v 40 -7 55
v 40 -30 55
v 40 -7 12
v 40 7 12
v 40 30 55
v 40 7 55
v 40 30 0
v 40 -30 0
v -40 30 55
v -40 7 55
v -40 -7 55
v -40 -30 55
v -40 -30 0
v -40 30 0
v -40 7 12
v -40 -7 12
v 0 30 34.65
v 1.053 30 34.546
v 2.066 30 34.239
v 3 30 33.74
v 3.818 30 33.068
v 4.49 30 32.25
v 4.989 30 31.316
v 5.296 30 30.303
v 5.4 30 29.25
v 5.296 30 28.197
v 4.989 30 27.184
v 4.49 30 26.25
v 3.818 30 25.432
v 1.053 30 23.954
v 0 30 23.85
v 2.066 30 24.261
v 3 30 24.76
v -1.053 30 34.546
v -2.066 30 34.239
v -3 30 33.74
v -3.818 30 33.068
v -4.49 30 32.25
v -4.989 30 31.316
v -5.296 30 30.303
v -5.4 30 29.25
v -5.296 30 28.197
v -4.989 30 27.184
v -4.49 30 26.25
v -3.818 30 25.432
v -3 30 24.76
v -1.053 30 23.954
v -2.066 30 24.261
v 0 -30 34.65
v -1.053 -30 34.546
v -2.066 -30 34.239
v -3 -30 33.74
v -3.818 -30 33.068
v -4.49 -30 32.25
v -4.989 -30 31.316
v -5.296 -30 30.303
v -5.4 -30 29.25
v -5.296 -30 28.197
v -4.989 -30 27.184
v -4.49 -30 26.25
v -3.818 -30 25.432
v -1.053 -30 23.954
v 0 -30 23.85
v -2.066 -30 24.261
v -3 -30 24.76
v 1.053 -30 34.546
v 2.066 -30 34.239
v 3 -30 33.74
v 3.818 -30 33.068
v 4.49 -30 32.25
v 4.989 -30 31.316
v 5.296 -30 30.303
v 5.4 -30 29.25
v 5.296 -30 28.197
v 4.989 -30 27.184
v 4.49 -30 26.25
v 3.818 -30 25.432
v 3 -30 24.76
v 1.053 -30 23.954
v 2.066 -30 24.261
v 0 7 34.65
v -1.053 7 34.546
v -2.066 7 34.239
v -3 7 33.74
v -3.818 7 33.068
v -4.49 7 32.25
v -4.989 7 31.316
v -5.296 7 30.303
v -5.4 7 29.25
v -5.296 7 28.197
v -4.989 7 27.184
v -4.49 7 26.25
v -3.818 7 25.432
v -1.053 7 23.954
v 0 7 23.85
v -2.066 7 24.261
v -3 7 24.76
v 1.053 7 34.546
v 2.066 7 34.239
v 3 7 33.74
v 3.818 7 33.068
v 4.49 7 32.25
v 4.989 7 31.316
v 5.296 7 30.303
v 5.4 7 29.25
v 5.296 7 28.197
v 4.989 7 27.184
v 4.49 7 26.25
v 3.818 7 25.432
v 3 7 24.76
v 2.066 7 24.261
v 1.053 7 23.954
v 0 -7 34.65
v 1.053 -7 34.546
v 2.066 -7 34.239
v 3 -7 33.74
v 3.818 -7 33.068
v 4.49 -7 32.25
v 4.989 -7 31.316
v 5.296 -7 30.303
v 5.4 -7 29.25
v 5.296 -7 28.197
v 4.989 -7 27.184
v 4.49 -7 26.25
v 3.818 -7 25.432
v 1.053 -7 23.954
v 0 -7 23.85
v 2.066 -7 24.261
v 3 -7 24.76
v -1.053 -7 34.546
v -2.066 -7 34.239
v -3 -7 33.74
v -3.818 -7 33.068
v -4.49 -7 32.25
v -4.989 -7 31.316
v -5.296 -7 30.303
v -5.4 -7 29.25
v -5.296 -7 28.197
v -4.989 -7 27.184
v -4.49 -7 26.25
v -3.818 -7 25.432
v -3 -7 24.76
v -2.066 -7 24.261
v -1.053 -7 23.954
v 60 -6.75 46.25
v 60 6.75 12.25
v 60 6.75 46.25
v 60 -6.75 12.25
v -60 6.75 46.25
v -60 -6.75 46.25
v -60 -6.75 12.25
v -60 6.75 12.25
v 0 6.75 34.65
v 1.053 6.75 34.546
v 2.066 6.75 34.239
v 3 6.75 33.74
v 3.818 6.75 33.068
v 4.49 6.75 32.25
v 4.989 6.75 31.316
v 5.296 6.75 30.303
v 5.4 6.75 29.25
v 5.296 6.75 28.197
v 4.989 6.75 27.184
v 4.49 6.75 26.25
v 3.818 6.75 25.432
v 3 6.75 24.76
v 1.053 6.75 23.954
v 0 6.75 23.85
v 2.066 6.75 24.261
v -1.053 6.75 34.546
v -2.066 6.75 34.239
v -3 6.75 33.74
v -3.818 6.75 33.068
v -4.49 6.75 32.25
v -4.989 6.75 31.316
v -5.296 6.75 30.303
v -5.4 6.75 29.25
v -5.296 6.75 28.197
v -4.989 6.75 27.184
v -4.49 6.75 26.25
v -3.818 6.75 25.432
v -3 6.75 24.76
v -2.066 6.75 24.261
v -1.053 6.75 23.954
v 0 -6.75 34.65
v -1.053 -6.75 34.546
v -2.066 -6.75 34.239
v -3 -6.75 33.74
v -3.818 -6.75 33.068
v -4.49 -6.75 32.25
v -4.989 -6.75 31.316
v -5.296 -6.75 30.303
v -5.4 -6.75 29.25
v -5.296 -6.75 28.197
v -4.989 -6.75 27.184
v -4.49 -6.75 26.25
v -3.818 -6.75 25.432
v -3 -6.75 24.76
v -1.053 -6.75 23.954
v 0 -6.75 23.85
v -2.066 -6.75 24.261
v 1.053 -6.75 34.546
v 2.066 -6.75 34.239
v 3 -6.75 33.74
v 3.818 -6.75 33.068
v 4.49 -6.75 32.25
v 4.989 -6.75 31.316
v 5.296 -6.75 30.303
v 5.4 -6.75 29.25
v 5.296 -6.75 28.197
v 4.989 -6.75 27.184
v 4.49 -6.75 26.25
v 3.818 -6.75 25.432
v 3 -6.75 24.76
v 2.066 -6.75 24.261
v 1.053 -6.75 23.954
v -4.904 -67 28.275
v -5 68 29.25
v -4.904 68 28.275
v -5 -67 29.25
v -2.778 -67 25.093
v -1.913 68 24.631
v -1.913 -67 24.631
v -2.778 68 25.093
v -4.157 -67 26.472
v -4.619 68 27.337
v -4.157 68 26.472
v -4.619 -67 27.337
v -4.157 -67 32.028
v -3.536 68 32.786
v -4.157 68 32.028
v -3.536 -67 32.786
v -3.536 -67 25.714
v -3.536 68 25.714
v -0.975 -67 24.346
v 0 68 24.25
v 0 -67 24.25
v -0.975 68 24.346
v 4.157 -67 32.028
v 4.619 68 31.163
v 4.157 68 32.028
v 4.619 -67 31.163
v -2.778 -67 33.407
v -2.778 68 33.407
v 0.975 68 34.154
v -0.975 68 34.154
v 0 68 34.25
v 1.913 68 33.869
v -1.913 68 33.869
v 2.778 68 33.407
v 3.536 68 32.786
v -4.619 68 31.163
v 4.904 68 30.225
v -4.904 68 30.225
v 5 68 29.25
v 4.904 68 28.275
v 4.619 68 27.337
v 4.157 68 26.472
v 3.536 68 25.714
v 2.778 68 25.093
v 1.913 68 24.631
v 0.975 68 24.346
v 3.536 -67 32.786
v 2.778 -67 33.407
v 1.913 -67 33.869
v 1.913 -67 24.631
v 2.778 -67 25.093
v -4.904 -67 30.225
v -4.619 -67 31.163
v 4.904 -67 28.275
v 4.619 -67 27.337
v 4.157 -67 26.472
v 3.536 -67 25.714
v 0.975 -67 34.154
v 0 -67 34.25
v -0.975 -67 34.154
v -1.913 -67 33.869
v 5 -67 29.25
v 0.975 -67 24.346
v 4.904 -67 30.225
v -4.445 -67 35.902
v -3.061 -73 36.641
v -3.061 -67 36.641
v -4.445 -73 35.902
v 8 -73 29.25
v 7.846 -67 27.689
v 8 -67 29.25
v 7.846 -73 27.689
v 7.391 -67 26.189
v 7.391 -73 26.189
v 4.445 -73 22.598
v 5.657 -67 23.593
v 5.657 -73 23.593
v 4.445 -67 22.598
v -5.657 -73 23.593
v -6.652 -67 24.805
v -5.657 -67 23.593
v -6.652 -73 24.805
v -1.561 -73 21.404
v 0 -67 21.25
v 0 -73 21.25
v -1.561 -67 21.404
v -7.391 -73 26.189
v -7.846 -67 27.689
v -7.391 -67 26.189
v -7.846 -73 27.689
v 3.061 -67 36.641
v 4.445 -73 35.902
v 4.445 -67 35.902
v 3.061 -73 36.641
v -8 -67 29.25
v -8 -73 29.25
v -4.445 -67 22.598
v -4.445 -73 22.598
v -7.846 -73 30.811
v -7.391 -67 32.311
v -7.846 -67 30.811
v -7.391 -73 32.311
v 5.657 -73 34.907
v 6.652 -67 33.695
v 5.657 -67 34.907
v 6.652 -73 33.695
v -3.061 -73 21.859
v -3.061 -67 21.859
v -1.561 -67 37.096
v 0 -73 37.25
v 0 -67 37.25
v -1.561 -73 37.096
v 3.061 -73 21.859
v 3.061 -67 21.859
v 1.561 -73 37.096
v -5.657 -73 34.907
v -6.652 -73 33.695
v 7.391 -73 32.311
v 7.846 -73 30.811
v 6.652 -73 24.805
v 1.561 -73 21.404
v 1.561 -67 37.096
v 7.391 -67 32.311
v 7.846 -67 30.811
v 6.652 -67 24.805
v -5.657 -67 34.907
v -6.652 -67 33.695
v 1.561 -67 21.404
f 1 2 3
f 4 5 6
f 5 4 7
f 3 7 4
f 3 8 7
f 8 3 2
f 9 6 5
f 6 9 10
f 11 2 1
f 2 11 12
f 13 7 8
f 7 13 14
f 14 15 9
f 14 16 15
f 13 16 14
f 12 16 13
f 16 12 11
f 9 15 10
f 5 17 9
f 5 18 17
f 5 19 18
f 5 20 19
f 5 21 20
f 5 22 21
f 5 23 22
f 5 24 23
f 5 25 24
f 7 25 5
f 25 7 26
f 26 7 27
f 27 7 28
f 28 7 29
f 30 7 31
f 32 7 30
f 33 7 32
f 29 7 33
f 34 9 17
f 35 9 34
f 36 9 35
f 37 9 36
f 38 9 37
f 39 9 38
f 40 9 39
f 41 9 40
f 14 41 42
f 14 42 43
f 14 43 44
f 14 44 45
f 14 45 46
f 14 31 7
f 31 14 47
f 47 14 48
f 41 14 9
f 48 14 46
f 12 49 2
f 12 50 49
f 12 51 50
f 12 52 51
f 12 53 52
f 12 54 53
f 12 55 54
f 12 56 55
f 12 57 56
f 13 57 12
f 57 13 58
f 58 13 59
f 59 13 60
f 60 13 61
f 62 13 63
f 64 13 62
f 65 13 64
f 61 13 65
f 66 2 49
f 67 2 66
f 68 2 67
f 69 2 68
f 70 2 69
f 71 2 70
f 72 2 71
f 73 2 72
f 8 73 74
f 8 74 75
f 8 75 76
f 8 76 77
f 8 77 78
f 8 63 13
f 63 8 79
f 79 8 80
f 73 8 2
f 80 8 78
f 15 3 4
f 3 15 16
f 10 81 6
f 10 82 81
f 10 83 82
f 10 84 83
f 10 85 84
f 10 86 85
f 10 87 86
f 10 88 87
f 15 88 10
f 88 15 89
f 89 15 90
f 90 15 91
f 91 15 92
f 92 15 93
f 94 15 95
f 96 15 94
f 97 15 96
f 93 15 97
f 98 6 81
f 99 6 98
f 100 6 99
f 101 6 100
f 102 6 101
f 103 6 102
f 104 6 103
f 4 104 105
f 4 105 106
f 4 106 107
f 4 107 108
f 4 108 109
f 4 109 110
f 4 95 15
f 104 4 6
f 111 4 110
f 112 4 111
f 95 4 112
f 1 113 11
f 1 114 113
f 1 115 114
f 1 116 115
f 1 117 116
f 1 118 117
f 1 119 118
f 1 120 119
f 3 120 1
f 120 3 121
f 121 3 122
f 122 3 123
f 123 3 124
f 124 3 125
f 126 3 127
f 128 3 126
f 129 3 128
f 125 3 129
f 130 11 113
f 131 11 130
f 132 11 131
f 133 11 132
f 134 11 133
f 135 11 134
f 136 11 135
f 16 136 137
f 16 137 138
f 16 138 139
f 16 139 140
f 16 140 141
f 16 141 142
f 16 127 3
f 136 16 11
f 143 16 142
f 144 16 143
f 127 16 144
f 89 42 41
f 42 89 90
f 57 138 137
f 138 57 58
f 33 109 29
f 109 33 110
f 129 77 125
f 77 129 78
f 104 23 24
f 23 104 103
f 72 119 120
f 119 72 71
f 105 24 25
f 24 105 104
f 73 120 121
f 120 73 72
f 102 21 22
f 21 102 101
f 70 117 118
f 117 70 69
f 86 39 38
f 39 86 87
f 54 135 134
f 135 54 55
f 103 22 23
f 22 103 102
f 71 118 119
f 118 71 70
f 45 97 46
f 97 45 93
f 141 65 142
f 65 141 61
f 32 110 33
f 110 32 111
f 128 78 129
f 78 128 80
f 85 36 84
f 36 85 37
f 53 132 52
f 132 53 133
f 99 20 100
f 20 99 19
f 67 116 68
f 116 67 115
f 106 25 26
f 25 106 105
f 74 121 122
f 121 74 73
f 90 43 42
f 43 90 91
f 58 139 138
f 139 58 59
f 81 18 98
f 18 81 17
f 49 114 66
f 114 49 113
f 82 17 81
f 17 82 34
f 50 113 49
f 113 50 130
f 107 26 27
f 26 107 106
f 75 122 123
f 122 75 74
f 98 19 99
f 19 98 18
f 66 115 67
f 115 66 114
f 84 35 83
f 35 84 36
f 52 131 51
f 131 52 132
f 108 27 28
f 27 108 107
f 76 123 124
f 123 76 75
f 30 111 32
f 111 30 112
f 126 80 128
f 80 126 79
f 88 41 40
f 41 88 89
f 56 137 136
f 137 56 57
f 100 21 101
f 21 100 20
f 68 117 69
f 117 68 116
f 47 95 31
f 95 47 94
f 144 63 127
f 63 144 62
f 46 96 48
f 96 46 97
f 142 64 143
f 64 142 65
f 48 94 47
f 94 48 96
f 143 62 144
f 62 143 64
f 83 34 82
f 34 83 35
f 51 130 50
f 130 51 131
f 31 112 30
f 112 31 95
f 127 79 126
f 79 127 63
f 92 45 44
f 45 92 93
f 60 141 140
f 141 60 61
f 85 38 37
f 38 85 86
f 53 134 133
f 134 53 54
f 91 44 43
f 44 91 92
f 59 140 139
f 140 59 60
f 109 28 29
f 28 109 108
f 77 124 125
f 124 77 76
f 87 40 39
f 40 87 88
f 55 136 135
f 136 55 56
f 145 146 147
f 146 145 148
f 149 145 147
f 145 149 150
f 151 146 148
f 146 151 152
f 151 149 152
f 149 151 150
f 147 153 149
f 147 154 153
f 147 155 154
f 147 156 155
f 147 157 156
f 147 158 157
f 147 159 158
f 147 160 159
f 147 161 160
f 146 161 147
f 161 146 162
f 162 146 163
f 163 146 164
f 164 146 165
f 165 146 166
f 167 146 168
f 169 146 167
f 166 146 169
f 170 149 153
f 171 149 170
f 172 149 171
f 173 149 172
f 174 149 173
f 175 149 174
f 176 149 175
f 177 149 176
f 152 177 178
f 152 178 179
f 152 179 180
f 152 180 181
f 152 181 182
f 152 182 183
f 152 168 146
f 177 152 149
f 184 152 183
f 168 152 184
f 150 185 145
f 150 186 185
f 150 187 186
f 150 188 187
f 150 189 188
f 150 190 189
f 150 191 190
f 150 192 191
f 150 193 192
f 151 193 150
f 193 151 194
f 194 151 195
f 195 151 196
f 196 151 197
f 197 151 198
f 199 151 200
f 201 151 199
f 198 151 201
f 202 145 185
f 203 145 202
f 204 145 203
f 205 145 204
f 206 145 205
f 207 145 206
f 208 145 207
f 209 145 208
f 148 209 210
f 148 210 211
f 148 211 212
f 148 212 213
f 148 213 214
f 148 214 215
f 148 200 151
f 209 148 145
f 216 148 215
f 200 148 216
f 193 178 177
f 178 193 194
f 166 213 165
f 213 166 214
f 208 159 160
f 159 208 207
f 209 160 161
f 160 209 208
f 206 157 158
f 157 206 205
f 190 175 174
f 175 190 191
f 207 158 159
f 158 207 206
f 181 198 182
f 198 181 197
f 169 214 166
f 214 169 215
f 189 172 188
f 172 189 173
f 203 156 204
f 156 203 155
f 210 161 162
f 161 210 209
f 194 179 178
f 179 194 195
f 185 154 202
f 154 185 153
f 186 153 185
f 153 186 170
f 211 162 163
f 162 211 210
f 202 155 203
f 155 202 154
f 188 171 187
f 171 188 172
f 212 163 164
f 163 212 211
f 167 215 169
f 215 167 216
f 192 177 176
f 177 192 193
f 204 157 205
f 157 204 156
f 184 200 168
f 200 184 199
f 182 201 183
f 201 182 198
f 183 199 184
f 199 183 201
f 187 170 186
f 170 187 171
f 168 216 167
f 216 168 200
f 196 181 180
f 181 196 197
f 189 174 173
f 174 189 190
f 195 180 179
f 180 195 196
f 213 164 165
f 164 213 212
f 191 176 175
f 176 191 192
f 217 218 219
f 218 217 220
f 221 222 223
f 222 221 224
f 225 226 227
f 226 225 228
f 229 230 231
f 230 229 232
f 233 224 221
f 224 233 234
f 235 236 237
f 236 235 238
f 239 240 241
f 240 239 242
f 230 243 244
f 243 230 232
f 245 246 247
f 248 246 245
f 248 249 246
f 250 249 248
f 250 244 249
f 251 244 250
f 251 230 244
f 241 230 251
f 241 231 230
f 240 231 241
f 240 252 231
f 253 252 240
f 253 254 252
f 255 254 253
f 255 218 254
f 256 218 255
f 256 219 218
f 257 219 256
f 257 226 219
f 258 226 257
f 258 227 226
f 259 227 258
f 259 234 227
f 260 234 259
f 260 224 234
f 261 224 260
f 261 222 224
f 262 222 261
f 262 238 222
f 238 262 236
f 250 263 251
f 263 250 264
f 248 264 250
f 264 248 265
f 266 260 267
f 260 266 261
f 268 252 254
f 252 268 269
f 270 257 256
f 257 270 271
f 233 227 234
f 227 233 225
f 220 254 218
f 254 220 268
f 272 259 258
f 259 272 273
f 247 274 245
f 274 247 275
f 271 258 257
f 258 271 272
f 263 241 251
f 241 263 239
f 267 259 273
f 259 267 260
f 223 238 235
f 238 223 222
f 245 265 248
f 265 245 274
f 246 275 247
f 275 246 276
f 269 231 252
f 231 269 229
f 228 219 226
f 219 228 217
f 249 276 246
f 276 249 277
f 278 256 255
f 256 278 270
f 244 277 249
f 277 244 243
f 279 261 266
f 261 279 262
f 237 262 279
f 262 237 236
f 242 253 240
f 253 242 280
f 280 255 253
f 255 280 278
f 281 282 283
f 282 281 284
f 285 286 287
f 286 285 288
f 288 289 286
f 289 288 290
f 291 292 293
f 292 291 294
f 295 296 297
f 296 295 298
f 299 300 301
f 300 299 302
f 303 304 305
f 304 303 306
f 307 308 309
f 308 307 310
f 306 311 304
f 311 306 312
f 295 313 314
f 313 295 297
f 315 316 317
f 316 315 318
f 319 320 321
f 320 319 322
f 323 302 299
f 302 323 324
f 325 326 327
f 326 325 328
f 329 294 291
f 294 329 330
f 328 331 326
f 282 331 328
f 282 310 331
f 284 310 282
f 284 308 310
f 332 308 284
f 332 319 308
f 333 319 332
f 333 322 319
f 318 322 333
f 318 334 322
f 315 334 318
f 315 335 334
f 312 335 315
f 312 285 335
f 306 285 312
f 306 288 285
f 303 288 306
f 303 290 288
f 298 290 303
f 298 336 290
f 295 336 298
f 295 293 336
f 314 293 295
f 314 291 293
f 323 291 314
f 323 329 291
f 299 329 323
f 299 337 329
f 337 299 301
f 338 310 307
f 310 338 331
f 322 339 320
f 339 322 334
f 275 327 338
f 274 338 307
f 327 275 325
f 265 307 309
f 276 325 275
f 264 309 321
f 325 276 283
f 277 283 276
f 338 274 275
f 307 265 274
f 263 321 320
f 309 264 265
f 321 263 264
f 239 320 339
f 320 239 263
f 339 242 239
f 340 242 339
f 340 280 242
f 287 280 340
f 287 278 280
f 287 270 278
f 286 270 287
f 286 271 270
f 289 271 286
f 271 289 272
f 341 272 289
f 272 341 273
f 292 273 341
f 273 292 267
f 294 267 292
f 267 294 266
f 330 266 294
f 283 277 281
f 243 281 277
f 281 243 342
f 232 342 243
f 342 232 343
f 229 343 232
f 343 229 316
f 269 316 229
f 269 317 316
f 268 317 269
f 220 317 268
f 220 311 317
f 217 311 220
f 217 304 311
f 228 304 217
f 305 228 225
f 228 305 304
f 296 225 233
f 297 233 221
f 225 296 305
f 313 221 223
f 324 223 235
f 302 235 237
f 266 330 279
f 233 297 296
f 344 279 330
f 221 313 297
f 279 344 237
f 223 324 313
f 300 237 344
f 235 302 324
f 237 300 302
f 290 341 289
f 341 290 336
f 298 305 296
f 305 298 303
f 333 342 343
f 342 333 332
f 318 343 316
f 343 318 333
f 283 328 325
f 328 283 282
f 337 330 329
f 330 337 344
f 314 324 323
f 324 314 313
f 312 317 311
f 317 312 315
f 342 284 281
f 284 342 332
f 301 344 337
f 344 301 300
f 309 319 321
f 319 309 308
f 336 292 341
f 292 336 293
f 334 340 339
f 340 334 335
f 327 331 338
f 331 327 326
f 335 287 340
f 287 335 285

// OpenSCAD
$fn = 32;

// ------------------------------------------------------------------------
// Clevis joint: 80 mm clevis, pin d10
// Every part is its own module, assembly() places them once.
// ------------------------------------------------------------------------

// --- part 1 ---
module clevis() {
  difference() {
    translate([-40, -30, 0]) cube([80, 60, 55]);
    translate([-41, -7, 12]) cube([82, 14, 44]);
    translate([0, 0, 29.25]) rotate([90, 0, 0]) cylinder(h = 62, d = 10.8, center = true);
  }
}

// --- part 2 ---
module eye() {
  difference() {
    translate([-60, -6.75, 0]) cube([120, 13.5, 34]);
    translate([0, 0, 17]) rotate([90, 0, 0]) cylinder(h = 15.5, d = 10.8, center = true);
  }
}

// --- part 3 ---
module pin() {
  rotate([0, 90, 0]) cylinder(h = 136, d = 10, center = true);
  translate([-73, 0, 0]) rotate([0, 90, 0]) cylinder(h = 6, d = 16);
}

// --- assembly ---
module assembly() {
  translate([0, 0, 0]) rotate([0, 0, 0]) clevis();
  translate([0, 0, 12.25]) rotate([0, 0, 0]) eye();
  translate([0, 0, 29.25]) rotate([0, 0, 90]) pin();
}

assembly();
